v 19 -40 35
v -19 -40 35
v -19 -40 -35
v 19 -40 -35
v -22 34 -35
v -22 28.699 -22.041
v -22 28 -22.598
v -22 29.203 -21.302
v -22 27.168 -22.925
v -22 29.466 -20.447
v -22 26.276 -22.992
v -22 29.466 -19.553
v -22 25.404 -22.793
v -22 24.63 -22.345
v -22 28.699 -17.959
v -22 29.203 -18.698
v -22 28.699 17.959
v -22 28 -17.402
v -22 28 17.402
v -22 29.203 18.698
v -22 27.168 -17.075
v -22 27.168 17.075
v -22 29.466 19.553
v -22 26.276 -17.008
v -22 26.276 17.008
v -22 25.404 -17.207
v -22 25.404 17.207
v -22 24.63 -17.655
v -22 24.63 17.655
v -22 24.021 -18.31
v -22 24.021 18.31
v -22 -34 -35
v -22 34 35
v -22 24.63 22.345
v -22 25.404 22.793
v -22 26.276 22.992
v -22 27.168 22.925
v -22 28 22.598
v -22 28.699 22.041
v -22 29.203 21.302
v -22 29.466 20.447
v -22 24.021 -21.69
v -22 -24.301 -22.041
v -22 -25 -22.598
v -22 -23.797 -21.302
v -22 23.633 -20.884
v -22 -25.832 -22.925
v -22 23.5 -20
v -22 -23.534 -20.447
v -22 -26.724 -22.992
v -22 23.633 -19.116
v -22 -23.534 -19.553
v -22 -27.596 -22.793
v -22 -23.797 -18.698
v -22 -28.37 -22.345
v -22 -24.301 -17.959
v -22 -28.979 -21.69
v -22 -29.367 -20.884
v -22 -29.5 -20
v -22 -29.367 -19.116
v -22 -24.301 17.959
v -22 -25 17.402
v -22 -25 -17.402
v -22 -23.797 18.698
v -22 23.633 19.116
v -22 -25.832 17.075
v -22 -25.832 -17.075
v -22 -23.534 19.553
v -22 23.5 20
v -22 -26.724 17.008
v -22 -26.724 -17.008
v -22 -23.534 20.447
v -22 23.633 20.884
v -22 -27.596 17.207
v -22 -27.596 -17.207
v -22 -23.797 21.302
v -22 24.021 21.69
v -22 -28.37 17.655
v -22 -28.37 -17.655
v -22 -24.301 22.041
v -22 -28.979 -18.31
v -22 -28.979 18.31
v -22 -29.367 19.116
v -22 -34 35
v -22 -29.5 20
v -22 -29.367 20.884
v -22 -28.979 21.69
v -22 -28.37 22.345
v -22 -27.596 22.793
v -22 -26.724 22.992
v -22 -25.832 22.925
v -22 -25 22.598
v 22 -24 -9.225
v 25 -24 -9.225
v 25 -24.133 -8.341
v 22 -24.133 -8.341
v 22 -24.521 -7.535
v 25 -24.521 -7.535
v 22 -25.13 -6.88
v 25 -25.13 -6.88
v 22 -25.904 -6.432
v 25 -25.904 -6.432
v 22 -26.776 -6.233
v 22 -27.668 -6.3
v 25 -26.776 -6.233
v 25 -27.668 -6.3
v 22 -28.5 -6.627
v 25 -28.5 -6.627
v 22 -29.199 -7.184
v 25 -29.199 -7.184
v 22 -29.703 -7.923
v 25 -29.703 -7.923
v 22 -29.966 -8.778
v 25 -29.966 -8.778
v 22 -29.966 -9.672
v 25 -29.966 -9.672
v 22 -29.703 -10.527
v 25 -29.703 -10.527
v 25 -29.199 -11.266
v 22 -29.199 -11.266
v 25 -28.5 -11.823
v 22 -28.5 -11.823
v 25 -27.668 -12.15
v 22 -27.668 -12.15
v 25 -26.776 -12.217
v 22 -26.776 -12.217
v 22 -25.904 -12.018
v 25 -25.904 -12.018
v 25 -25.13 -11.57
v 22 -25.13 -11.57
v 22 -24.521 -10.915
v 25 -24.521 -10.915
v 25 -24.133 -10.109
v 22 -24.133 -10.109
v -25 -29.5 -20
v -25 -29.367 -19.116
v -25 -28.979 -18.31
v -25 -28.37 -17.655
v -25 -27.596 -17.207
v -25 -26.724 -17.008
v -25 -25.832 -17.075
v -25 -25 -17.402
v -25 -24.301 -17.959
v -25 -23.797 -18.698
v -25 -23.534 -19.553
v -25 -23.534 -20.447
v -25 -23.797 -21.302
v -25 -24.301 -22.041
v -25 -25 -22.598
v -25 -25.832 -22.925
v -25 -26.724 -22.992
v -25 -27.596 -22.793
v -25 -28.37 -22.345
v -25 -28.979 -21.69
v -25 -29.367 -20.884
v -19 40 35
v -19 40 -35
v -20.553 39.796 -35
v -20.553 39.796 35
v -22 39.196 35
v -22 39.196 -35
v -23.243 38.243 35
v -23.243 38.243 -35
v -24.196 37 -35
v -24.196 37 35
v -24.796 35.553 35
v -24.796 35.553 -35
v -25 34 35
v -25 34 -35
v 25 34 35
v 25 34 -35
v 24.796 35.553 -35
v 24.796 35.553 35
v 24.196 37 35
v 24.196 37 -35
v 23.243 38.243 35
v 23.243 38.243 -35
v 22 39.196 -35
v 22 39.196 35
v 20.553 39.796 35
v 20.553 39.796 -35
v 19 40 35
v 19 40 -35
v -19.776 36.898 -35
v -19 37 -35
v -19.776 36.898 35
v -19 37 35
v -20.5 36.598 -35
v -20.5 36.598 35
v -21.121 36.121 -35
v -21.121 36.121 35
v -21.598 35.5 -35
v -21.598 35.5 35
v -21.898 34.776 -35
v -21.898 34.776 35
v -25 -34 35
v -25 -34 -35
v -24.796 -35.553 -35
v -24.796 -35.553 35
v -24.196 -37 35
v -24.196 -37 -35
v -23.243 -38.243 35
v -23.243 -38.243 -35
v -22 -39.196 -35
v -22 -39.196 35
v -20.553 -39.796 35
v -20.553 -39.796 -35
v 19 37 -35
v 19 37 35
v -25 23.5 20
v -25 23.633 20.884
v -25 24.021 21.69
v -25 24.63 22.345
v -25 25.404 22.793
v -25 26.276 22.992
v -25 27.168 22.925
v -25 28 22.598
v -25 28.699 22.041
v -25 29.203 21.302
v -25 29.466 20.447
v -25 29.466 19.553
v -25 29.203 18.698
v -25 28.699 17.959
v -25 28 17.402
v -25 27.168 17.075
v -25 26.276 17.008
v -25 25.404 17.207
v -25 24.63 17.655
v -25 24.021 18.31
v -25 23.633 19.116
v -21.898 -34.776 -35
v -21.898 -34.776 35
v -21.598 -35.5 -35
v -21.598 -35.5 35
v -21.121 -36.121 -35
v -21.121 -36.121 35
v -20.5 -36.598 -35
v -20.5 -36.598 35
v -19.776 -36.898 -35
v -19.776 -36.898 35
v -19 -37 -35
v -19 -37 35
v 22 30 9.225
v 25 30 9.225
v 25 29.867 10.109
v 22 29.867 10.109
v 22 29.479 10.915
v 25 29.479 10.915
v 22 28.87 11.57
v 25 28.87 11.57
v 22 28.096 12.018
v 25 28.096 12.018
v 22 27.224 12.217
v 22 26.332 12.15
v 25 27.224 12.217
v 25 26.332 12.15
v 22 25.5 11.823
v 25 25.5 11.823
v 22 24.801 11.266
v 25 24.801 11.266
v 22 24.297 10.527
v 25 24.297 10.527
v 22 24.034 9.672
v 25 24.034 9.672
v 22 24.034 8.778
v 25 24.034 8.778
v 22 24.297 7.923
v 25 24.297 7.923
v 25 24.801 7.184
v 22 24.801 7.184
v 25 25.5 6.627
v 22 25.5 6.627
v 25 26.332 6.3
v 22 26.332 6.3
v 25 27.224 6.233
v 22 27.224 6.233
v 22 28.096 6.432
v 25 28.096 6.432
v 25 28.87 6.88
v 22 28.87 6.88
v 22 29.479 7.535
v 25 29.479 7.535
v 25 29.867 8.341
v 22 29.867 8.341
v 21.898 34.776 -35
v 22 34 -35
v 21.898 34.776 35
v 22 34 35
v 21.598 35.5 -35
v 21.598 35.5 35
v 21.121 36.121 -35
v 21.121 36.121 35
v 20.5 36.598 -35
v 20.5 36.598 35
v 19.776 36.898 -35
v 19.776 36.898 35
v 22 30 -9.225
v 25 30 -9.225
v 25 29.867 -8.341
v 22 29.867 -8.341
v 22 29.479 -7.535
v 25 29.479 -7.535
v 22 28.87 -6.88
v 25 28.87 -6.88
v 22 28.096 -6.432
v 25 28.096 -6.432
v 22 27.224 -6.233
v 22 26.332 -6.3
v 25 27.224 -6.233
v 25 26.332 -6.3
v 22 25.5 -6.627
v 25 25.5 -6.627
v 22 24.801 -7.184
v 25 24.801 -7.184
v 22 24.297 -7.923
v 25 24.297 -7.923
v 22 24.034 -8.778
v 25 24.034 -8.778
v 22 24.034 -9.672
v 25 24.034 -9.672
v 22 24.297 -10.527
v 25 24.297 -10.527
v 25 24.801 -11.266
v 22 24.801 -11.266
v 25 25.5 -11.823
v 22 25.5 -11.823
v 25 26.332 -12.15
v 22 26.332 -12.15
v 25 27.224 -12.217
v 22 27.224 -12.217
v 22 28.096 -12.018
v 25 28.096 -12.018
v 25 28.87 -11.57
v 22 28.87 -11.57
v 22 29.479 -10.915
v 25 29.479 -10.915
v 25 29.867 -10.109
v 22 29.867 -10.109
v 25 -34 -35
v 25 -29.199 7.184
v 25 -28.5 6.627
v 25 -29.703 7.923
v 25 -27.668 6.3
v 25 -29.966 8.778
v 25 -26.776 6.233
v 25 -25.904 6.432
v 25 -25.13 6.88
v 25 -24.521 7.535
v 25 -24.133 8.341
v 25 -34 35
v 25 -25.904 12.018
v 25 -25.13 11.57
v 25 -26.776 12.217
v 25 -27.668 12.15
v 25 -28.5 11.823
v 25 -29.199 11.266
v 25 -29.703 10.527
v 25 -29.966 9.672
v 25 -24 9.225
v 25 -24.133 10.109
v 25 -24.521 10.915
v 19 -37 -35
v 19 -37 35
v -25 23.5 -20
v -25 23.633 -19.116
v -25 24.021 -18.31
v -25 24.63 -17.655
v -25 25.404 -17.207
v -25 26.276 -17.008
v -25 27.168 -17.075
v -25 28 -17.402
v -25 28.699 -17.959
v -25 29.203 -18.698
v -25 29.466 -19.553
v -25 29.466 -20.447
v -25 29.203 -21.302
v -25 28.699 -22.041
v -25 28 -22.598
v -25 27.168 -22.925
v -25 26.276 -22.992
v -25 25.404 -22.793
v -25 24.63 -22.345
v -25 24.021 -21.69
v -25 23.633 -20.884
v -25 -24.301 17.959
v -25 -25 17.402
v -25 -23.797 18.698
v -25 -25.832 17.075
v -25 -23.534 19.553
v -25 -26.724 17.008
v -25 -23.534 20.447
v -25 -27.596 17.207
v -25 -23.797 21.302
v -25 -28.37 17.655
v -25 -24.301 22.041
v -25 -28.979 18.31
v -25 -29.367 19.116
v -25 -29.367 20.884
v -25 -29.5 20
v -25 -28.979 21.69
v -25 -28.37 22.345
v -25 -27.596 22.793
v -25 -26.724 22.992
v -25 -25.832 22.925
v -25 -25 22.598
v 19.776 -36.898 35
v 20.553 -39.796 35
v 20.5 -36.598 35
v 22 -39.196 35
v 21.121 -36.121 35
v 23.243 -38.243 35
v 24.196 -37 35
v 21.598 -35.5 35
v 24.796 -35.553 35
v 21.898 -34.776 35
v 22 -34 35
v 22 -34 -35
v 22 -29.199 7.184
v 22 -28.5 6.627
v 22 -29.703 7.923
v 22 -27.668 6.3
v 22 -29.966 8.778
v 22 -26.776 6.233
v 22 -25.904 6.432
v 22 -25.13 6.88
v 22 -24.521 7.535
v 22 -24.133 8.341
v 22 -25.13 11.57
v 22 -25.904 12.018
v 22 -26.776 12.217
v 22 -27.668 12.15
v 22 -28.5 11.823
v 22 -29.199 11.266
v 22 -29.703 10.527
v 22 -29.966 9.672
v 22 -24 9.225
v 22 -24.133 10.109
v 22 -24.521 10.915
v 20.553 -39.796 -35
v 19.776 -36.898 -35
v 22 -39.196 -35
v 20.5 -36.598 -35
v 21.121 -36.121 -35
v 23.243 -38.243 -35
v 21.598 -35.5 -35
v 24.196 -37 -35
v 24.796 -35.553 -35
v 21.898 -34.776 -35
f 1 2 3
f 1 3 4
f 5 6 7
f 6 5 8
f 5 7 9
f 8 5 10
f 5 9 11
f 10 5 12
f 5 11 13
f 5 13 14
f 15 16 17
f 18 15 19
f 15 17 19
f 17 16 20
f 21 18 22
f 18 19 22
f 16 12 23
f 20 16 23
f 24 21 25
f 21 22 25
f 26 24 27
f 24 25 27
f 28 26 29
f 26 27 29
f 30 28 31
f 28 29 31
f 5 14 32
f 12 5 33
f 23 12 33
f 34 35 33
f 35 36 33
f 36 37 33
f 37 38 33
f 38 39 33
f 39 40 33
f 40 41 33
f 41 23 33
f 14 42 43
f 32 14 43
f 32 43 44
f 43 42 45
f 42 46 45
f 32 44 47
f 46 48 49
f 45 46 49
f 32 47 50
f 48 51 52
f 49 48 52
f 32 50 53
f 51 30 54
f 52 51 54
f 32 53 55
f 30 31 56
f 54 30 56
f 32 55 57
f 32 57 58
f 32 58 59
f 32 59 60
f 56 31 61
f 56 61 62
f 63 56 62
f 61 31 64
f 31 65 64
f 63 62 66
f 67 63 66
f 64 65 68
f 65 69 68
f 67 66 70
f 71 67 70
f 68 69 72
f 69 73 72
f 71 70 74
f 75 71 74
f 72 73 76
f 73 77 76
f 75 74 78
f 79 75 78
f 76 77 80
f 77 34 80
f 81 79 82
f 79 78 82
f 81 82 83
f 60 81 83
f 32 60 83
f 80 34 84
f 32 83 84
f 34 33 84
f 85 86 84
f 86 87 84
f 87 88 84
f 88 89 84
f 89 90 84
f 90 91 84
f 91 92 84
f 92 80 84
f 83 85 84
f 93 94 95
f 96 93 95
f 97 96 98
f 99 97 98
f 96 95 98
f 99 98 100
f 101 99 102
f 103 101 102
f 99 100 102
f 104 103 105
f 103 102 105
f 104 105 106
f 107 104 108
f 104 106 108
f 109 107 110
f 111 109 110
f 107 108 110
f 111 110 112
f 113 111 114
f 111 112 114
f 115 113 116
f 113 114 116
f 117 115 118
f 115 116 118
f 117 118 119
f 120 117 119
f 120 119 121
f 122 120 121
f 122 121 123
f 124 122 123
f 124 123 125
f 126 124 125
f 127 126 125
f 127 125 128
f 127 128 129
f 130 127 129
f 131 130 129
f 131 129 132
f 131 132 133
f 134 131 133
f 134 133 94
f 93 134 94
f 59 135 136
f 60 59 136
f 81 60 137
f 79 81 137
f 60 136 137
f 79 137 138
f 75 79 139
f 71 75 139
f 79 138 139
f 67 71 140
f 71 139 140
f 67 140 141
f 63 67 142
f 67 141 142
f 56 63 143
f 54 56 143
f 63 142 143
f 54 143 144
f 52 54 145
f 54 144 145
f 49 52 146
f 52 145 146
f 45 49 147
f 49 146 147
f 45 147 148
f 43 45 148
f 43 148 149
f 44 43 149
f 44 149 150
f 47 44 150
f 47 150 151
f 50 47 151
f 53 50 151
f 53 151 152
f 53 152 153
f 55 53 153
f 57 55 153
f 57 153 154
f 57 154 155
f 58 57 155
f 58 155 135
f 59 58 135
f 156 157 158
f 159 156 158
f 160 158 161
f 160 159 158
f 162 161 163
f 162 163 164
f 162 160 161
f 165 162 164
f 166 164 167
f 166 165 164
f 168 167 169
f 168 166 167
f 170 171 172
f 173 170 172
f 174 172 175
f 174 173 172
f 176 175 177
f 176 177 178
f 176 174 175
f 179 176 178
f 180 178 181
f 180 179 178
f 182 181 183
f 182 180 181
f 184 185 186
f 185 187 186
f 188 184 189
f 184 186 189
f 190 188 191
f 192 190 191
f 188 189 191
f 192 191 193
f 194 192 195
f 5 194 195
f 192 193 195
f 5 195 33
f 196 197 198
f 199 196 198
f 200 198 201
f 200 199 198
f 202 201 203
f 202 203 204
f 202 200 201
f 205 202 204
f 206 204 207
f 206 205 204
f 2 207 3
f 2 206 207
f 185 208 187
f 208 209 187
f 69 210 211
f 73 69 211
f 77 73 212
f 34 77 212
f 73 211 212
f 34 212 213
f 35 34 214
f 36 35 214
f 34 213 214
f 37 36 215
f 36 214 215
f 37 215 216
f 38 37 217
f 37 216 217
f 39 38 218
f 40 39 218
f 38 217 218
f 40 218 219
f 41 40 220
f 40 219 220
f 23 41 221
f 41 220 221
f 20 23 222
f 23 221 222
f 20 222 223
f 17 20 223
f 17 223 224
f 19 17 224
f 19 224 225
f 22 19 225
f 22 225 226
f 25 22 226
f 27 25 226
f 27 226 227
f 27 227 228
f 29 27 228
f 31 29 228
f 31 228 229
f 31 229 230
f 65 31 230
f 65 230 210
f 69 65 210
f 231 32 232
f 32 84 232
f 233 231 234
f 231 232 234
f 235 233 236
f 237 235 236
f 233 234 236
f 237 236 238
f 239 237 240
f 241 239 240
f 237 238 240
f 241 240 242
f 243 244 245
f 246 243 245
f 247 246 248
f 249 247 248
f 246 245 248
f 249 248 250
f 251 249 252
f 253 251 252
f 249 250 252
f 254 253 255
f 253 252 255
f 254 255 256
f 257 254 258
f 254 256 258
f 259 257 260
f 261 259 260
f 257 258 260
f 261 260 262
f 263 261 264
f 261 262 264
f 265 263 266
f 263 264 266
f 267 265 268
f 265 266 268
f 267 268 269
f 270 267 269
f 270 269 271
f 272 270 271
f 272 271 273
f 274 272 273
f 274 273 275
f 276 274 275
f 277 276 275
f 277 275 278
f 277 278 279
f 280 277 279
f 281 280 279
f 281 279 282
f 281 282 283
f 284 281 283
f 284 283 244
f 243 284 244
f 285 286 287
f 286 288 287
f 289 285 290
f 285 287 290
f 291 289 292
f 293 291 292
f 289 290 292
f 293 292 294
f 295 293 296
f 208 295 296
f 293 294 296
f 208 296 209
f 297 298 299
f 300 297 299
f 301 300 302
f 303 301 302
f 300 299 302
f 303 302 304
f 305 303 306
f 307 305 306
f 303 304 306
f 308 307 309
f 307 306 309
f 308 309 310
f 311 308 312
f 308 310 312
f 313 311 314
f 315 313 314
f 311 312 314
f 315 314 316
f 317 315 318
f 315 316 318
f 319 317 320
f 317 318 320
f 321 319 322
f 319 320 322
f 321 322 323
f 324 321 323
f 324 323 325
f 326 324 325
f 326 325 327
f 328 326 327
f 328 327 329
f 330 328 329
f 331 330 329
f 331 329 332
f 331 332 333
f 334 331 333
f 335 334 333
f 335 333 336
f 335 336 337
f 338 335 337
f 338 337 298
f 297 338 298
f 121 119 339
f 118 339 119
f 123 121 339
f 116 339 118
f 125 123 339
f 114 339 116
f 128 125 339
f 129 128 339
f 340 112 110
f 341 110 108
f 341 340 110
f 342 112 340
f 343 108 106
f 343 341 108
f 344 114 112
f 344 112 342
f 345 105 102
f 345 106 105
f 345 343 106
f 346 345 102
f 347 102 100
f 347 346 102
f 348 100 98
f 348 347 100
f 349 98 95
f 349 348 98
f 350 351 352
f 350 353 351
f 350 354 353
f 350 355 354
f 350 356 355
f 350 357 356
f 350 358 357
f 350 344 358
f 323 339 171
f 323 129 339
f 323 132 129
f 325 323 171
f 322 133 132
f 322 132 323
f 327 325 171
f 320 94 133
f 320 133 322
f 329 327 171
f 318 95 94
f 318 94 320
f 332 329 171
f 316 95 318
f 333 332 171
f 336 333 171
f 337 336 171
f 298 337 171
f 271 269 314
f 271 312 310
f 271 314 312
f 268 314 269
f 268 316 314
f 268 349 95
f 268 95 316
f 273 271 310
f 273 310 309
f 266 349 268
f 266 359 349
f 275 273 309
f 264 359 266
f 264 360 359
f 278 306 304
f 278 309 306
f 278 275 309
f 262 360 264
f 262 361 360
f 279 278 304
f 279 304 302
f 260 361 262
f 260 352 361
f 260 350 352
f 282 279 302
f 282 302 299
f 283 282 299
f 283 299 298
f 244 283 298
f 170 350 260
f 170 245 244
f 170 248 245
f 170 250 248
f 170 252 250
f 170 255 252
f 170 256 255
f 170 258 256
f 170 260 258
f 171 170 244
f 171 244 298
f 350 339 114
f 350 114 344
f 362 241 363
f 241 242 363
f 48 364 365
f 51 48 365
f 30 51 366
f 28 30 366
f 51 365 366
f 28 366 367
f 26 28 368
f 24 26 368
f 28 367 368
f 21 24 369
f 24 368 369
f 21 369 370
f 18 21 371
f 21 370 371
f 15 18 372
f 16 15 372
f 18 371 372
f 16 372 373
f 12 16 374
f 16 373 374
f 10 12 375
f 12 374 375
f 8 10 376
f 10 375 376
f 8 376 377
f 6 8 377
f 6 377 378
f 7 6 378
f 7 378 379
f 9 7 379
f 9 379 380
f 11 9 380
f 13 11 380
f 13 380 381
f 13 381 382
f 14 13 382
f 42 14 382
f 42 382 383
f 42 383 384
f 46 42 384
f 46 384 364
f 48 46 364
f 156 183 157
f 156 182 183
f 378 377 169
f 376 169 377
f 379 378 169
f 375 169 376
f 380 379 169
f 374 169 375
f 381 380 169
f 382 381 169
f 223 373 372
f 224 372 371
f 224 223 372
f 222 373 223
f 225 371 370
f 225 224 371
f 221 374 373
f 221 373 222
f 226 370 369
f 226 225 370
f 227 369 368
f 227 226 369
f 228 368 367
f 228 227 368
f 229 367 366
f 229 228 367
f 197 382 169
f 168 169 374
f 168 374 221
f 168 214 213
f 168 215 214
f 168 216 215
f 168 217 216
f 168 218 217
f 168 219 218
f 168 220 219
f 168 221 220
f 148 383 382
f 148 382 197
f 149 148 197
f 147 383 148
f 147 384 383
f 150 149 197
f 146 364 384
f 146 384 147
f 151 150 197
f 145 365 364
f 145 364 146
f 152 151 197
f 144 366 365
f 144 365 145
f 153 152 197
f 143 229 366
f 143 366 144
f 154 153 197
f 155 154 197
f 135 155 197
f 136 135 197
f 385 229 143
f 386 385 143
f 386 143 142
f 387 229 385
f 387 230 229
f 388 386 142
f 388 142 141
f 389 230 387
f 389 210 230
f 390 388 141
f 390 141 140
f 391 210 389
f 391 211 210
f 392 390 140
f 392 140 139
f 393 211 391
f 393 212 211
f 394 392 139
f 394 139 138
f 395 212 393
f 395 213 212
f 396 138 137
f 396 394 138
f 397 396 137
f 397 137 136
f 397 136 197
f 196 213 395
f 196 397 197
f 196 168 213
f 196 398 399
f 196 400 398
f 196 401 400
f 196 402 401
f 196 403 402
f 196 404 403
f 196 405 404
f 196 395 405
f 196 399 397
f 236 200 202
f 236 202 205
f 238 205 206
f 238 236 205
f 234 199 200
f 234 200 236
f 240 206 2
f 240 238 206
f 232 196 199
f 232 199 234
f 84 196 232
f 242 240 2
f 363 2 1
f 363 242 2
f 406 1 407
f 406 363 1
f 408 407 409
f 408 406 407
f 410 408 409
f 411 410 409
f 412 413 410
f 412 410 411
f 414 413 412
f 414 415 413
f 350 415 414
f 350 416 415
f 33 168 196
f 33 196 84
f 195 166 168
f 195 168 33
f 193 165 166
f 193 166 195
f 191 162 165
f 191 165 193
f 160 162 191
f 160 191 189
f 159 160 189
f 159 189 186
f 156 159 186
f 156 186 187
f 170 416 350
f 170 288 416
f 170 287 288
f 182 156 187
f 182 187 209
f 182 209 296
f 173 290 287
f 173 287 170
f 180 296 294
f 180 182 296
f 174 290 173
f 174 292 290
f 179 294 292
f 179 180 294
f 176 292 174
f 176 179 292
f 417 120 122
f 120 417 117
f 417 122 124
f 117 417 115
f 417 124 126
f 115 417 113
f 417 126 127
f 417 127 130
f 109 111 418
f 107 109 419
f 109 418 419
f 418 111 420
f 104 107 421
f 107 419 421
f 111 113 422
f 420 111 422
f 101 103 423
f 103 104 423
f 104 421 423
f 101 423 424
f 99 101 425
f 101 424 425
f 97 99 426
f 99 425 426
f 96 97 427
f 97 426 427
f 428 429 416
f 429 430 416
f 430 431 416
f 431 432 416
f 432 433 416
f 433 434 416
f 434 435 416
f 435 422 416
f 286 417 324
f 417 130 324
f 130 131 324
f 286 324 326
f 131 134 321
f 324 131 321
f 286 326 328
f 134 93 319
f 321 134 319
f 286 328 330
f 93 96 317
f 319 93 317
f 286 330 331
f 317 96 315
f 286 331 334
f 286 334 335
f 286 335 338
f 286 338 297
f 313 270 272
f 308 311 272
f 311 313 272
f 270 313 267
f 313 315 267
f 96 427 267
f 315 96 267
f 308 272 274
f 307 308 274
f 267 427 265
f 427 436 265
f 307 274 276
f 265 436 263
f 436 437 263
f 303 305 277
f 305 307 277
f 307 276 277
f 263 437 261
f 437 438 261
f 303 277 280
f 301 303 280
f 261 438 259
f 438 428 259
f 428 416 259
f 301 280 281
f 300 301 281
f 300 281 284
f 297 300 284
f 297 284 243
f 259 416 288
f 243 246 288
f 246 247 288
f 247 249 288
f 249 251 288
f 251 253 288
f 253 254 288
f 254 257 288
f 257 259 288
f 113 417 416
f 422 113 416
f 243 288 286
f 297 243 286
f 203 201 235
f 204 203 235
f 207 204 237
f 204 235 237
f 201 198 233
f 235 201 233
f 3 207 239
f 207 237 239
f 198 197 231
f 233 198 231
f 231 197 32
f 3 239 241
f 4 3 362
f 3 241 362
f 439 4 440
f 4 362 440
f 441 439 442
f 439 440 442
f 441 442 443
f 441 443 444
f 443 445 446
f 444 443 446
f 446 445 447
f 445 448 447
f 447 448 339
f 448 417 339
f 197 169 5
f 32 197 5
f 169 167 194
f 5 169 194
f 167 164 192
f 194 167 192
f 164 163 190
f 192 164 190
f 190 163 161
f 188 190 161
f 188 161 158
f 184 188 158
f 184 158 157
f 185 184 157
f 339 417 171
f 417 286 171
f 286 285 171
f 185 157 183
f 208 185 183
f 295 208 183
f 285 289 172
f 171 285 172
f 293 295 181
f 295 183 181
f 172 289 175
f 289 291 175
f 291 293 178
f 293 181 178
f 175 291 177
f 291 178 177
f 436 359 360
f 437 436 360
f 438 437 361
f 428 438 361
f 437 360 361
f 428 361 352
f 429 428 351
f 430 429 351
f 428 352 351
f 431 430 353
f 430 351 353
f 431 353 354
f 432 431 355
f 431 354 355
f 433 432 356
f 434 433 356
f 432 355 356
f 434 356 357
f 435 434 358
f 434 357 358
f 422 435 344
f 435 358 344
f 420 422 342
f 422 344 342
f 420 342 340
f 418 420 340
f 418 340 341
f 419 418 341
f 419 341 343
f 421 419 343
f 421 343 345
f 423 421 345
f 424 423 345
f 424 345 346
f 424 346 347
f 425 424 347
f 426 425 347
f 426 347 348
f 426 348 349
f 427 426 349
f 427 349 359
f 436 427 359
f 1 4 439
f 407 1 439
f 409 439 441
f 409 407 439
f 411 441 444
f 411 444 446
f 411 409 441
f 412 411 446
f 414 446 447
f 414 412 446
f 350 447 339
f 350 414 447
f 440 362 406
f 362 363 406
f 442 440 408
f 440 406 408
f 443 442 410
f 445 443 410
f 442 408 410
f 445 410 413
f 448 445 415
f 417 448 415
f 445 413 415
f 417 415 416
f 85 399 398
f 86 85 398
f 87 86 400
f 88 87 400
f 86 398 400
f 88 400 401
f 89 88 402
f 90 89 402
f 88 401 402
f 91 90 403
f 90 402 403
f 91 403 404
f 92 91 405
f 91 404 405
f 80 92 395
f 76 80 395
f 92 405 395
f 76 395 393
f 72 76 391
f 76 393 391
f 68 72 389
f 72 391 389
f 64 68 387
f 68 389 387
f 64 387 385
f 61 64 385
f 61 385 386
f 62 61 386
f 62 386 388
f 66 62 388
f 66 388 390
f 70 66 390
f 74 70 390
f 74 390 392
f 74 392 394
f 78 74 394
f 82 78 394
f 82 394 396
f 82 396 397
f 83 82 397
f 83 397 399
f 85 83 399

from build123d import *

# Parameters (mm, degrees)
BOSS_EXTRUDE4_DEPTH = 35
SKETCH11_R          = 3
CUT_EXTRUDE7_DEPTH  = 20
SKETCH12_R          = 3
CUT_EXTRUDE8_DEPTH  = 20


with BuildPart() as part:
    # Sketch9 → Boss-Extrude4 (new, symmetric)
    with BuildSketch(Plane.XY):
        with BuildLine():
            Line((19, 40), (-19, 40))
            ThreePointArc((-19, 40), (-23.242640687, 38.242640687), (-25, 34))
            Line((-25, 34), (-25, -34))
            ThreePointArc((-25, -34), (-23.242640687, -38.242640687), (-19, -40))
            Line((-19, -40), (19, -40))
            ThreePointArc((19, -40), (23.242640687, -38.242640687), (25, -34))
            Line((25, -34), (25, 34))
            ThreePointArc((25, 34), (23.242640687, 38.242640687), (19, 40))
        make_face()
        with BuildLine():
            Line((22, -34), (22, 34))
            ThreePointArc((22, 34), (21.121320344, 36.121320344), (19, 37))
            Line((19, 37), (-19, 37))
            ThreePointArc((-19, 37), (-21.121320344, 36.121320344), (-22, 34))
            Line((-22, 34), (-22, -34))
            ThreePointArc((-22, -34), (-21.121320344, -36.121320344), (-19, -37))
            Line((-19, -37), (19, -37))
            ThreePointArc((19, -37), (21.121320344, -36.121320344), (22, -34))
        make_face(mode=Mode.SUBTRACT)
    extrude(amount=BOSS_EXTRUDE4_DEPTH, both=True)

    # Sketch11 → Cut-Extrude7 (cut)
    with BuildSketch(Plane.ZY.offset(25)):
        with Locations(Location((-20, 26.5, 0), (0, 0, 270))):
            Circle(SKETCH11_R)
        with Locations(Location((20, 26.5, 0), (0, 0, 270))):
            Circle(SKETCH11_R)
        with Locations(Location((20, -26.5, 0), (0, 0, 270))):
            Circle(SKETCH11_R)
        with Locations(Location((-20, -26.5, 0), (0, 0, 270))):
            Circle(SKETCH11_R)
    extrude(amount=-CUT_EXTRUDE7_DEPTH, mode=Mode.SUBTRACT)

    # Sketch12 → Cut-Extrude8 (cut)
    with BuildSketch(Plane(origin=(25, 0, 0), x_dir=(0, 0, -1), z_dir=(1, 0, 0))):
        with Locations(Location((-9.225, 27, 0), (0, 0, 90))):
            Circle(SKETCH12_R)
        with Locations(Location((9.225, 27, 0), (0, 0, 90))):
            Circle(SKETCH12_R)
        with Locations(Location((9.225, -27, 0), (0, 0, 90))):
            Circle(SKETCH12_R)
        with Locations(Location((-9.225, -27, 0), (0, 0, 90))):
            Circle(SKETCH12_R)
    extrude(amount=-CUT_EXTRUDE8_DEPTH, mode=Mode.SUBTRACT)


solid = part.part
